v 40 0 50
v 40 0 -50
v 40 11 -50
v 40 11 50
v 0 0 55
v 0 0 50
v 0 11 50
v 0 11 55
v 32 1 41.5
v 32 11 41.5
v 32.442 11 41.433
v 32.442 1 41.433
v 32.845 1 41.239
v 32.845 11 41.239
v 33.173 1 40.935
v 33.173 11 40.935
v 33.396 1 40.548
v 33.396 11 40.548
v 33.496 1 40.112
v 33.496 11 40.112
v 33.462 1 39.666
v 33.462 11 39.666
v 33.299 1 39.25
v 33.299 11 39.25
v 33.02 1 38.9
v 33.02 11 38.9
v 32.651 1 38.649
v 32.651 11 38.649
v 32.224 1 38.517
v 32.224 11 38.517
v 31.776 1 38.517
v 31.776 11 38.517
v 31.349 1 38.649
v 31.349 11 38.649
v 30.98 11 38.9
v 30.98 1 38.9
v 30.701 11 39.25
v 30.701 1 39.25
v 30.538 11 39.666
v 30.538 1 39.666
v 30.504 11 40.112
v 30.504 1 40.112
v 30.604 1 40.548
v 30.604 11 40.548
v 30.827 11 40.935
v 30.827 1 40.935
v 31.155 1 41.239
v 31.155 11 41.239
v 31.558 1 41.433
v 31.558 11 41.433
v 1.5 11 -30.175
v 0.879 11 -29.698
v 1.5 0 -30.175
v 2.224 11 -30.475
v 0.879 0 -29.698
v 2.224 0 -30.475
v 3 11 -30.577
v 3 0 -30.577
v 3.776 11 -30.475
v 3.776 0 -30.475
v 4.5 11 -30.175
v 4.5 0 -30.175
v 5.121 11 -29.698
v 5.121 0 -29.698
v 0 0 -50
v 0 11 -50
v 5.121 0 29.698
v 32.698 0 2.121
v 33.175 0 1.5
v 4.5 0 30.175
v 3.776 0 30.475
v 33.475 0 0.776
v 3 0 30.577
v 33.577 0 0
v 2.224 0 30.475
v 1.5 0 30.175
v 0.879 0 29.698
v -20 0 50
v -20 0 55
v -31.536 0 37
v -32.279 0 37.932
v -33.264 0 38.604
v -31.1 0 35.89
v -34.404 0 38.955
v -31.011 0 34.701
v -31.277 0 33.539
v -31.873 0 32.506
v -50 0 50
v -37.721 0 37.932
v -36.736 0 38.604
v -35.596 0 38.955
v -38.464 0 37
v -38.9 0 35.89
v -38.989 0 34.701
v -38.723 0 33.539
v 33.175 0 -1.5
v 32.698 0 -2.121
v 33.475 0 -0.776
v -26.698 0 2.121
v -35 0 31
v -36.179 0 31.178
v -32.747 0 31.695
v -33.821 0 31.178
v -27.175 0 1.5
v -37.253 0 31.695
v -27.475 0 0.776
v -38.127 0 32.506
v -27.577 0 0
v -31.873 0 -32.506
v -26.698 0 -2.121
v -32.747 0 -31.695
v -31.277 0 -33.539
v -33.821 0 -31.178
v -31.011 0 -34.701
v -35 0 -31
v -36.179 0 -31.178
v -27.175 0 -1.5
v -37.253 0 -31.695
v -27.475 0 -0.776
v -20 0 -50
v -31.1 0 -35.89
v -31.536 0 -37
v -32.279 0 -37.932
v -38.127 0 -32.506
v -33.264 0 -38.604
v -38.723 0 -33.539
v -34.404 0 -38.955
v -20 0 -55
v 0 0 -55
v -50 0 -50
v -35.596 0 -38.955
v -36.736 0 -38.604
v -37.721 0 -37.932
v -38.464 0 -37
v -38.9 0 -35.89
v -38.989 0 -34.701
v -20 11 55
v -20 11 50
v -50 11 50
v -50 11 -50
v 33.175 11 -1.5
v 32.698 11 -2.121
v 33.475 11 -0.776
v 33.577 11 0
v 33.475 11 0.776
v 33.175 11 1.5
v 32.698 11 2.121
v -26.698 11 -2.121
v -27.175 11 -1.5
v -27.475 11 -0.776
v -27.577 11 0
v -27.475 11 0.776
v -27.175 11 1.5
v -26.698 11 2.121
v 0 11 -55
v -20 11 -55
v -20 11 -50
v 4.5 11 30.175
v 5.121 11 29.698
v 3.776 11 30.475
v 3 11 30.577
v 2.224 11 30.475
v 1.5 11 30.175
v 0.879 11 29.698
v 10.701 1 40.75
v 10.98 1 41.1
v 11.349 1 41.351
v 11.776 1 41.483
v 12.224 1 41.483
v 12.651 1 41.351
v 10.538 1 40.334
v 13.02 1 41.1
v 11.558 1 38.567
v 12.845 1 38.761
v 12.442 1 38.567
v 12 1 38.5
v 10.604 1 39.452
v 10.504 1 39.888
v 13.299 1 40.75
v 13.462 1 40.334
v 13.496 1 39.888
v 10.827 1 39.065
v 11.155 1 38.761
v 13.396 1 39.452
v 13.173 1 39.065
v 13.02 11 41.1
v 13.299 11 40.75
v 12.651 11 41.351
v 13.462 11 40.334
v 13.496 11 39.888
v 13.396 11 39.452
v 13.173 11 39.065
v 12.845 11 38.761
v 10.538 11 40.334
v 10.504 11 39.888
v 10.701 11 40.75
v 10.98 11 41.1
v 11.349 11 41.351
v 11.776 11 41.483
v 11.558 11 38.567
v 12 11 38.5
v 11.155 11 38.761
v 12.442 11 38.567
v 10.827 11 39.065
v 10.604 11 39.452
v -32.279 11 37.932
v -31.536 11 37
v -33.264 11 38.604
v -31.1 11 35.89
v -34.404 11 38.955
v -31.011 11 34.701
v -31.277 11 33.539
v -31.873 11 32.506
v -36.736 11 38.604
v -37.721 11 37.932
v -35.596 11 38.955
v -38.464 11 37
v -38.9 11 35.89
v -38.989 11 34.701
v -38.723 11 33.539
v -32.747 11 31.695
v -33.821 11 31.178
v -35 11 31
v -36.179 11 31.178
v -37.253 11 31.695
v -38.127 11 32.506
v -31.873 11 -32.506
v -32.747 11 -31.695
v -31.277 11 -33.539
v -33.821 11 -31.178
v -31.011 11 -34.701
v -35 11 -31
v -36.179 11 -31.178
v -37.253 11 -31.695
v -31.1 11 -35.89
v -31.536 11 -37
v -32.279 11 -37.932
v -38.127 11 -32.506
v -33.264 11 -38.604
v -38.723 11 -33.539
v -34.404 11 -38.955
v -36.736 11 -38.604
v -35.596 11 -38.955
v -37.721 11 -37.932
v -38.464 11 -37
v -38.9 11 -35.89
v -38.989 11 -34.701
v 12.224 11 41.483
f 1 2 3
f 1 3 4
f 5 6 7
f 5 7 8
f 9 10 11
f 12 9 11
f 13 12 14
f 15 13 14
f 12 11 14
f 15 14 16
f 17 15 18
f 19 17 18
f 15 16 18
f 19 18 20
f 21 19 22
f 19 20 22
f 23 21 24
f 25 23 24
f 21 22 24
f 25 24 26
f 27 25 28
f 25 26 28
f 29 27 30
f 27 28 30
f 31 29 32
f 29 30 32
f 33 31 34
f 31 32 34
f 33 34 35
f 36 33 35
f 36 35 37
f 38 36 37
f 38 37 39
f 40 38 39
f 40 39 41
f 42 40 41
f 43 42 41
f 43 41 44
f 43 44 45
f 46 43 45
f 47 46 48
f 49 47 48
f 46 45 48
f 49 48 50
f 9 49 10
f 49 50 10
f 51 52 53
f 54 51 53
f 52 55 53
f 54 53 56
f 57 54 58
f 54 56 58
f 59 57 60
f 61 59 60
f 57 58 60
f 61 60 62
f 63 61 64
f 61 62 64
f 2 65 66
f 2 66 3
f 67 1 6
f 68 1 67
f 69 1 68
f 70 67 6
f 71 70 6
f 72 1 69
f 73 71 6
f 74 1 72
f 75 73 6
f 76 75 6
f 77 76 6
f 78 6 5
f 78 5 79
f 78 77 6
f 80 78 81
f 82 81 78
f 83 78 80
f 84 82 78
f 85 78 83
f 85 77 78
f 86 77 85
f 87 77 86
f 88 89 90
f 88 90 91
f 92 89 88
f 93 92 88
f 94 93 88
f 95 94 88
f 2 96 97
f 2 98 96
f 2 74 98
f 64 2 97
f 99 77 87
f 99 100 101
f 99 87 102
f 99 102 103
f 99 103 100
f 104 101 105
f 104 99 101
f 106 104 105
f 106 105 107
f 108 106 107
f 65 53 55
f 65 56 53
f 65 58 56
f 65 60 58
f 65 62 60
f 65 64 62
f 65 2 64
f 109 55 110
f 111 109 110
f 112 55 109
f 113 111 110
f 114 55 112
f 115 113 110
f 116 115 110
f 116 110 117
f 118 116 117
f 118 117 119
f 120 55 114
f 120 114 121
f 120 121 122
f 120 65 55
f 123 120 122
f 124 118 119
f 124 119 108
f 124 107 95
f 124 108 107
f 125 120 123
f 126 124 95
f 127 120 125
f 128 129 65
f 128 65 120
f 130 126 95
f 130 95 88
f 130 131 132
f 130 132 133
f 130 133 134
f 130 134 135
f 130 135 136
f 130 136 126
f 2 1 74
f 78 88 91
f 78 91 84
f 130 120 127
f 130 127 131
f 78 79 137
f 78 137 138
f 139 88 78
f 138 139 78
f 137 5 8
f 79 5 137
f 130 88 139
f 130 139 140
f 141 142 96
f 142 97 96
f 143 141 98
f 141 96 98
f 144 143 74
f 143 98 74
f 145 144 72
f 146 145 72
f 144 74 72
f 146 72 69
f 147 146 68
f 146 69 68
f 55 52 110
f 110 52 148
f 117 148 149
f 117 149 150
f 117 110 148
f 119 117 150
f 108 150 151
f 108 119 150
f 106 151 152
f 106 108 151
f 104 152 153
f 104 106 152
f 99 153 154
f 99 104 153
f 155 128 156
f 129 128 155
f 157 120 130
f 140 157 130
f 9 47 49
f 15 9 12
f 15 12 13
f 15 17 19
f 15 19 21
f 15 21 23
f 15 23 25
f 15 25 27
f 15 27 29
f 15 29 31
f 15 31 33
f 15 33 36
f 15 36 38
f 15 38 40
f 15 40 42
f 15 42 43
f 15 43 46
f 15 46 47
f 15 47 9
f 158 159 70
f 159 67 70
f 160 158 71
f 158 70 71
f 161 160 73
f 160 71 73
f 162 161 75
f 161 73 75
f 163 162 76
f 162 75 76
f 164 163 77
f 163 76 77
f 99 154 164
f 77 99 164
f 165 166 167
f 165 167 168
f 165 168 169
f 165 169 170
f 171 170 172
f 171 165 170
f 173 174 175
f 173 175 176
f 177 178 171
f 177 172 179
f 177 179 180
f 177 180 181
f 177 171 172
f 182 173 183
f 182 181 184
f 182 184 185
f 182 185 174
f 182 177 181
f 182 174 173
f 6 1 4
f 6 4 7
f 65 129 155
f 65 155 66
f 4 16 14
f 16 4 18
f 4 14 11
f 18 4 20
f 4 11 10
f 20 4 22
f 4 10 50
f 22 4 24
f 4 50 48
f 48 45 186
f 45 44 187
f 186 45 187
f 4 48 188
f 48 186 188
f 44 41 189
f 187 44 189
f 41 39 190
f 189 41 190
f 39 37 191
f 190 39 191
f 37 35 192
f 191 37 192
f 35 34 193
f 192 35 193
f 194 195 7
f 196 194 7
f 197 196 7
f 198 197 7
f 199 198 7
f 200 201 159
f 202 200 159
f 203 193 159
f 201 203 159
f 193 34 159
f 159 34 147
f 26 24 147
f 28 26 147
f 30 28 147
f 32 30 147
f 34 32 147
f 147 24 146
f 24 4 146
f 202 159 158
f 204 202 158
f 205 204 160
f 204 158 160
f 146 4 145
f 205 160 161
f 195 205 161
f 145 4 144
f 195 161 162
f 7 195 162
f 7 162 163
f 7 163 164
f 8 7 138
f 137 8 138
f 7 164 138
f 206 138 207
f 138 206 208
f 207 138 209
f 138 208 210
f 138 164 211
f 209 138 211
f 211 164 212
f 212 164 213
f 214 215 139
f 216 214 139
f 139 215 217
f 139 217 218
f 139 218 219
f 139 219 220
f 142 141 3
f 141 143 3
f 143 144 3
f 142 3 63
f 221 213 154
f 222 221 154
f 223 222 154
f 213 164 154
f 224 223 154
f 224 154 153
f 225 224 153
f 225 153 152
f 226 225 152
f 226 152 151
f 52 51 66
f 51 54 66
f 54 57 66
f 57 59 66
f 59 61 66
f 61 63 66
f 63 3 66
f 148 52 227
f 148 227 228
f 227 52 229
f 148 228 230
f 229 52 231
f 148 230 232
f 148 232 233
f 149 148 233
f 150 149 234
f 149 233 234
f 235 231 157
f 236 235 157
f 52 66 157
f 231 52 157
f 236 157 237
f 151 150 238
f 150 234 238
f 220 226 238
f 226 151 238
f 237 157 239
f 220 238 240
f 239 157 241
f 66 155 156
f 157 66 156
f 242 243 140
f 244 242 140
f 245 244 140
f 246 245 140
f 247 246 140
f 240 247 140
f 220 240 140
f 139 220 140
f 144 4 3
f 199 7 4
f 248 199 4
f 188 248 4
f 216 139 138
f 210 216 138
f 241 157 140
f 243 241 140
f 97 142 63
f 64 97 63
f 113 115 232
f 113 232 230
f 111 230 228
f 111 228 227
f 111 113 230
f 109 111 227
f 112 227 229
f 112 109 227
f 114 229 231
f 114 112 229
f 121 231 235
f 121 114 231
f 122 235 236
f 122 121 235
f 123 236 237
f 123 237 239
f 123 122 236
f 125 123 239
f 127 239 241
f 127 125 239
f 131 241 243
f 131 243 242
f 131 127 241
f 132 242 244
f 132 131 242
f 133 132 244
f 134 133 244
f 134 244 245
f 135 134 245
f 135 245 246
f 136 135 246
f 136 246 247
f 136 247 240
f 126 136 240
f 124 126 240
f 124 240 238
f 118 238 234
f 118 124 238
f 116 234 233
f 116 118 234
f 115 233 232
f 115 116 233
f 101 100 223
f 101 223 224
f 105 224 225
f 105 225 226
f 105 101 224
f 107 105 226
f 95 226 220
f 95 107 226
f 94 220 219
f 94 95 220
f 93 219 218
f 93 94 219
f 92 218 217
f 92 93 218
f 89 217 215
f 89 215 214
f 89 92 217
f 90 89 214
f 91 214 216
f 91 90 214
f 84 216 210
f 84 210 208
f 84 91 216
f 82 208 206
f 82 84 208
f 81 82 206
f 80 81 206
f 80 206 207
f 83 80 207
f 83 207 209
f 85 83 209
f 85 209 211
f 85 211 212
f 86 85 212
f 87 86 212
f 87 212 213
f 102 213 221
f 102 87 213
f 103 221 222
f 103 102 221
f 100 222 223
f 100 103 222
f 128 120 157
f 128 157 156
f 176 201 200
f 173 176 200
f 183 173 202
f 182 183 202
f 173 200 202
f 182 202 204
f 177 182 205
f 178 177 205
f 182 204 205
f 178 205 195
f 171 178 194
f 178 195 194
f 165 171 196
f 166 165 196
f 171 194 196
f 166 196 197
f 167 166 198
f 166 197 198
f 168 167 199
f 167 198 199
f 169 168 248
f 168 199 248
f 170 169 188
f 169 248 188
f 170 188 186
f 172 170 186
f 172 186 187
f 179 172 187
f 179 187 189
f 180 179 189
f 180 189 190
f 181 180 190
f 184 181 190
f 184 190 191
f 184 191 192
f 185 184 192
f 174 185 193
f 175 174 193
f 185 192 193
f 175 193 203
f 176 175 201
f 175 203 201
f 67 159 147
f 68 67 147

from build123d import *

# Parameters (mm, degrees)
SKETCH1_R           = 4
BOSS_EXTRUDE1_DEPTH = 11
SKETCH2_R           = 1.5
CUT_EXTRUDE1_DEPTH  = 10
CUT_EXTRUDE2_DEPTH  = 11
FILLET1_R           = 3


with BuildPart() as part:
    # Sketch1 → Boss-Extrude1 (new body)
    with BuildSketch(Plane(origin=(0, 0, 0), x_dir=(1, 0, 0), z_dir=(0, 1, 0))):
        Polygon((0, 50), (40, 50), (40, -50), (0, -50), (0, -55), (-20, -55), (-20, -50), (-40, -50), (-50, -50), (-50, 50), (-40, 50), (-20, 50), (-20, 55), (0, 55), align=None)
        with Locations(Location((-35, 35, 0), (0, 0, 270))):
            Circle(SKETCH1_R, mode=Mode.SUBTRACT)
        with Locations(Location((-35, -35, 0), (0, 0, 90))):
            Circle(SKETCH1_R, mode=Mode.SUBTRACT)
    extrude(amount=BOSS_EXTRUDE1_DEPTH)

    # Sketch2 → Cut-Extrude1 (cut)
    with BuildSketch(Plane(origin=(0, 11, 0), x_dir=(1, 0, 0), z_dir=(0, 1, 0))):
        with Locations(Location((32, -40, 0), (0, 0, 270))):
            Circle(SKETCH2_R)
        with Locations(Location((12, -40, 0), (0, 0, 90))):
            Circle(SKETCH2_R)
    extrude(amount=-CUT_EXTRUDE1_DEPTH, mode=Mode.SUBTRACT)

    # Sketch3 → Cut-Extrude2 (cut)
    with BuildSketch(Plane(origin=(0, 11, 0), x_dir=(1, 0, 0), z_dir=(0, 1, 0))):
        Polygon((-28.819805153, 0), (3, -31.819805153), (34.819805153, 0), (3, 31.819805153), align=None)
    extrude(amount=-CUT_EXTRUDE2_DEPTH, mode=Mode.SUBTRACT)

    # Fillet1
    fillet1_edges = [part.edges().sort_by_distance(p)[0] for p in [
        (-28.819805153, 5.5, 0),
        (3, 5.5, -31.819805153),
        (34.819805153, 5.5, 0),
        (3, 5.5, 31.819805153),
    ]]
    fillet(fillet1_edges, radius=FILLET1_R)


solid = part.part
